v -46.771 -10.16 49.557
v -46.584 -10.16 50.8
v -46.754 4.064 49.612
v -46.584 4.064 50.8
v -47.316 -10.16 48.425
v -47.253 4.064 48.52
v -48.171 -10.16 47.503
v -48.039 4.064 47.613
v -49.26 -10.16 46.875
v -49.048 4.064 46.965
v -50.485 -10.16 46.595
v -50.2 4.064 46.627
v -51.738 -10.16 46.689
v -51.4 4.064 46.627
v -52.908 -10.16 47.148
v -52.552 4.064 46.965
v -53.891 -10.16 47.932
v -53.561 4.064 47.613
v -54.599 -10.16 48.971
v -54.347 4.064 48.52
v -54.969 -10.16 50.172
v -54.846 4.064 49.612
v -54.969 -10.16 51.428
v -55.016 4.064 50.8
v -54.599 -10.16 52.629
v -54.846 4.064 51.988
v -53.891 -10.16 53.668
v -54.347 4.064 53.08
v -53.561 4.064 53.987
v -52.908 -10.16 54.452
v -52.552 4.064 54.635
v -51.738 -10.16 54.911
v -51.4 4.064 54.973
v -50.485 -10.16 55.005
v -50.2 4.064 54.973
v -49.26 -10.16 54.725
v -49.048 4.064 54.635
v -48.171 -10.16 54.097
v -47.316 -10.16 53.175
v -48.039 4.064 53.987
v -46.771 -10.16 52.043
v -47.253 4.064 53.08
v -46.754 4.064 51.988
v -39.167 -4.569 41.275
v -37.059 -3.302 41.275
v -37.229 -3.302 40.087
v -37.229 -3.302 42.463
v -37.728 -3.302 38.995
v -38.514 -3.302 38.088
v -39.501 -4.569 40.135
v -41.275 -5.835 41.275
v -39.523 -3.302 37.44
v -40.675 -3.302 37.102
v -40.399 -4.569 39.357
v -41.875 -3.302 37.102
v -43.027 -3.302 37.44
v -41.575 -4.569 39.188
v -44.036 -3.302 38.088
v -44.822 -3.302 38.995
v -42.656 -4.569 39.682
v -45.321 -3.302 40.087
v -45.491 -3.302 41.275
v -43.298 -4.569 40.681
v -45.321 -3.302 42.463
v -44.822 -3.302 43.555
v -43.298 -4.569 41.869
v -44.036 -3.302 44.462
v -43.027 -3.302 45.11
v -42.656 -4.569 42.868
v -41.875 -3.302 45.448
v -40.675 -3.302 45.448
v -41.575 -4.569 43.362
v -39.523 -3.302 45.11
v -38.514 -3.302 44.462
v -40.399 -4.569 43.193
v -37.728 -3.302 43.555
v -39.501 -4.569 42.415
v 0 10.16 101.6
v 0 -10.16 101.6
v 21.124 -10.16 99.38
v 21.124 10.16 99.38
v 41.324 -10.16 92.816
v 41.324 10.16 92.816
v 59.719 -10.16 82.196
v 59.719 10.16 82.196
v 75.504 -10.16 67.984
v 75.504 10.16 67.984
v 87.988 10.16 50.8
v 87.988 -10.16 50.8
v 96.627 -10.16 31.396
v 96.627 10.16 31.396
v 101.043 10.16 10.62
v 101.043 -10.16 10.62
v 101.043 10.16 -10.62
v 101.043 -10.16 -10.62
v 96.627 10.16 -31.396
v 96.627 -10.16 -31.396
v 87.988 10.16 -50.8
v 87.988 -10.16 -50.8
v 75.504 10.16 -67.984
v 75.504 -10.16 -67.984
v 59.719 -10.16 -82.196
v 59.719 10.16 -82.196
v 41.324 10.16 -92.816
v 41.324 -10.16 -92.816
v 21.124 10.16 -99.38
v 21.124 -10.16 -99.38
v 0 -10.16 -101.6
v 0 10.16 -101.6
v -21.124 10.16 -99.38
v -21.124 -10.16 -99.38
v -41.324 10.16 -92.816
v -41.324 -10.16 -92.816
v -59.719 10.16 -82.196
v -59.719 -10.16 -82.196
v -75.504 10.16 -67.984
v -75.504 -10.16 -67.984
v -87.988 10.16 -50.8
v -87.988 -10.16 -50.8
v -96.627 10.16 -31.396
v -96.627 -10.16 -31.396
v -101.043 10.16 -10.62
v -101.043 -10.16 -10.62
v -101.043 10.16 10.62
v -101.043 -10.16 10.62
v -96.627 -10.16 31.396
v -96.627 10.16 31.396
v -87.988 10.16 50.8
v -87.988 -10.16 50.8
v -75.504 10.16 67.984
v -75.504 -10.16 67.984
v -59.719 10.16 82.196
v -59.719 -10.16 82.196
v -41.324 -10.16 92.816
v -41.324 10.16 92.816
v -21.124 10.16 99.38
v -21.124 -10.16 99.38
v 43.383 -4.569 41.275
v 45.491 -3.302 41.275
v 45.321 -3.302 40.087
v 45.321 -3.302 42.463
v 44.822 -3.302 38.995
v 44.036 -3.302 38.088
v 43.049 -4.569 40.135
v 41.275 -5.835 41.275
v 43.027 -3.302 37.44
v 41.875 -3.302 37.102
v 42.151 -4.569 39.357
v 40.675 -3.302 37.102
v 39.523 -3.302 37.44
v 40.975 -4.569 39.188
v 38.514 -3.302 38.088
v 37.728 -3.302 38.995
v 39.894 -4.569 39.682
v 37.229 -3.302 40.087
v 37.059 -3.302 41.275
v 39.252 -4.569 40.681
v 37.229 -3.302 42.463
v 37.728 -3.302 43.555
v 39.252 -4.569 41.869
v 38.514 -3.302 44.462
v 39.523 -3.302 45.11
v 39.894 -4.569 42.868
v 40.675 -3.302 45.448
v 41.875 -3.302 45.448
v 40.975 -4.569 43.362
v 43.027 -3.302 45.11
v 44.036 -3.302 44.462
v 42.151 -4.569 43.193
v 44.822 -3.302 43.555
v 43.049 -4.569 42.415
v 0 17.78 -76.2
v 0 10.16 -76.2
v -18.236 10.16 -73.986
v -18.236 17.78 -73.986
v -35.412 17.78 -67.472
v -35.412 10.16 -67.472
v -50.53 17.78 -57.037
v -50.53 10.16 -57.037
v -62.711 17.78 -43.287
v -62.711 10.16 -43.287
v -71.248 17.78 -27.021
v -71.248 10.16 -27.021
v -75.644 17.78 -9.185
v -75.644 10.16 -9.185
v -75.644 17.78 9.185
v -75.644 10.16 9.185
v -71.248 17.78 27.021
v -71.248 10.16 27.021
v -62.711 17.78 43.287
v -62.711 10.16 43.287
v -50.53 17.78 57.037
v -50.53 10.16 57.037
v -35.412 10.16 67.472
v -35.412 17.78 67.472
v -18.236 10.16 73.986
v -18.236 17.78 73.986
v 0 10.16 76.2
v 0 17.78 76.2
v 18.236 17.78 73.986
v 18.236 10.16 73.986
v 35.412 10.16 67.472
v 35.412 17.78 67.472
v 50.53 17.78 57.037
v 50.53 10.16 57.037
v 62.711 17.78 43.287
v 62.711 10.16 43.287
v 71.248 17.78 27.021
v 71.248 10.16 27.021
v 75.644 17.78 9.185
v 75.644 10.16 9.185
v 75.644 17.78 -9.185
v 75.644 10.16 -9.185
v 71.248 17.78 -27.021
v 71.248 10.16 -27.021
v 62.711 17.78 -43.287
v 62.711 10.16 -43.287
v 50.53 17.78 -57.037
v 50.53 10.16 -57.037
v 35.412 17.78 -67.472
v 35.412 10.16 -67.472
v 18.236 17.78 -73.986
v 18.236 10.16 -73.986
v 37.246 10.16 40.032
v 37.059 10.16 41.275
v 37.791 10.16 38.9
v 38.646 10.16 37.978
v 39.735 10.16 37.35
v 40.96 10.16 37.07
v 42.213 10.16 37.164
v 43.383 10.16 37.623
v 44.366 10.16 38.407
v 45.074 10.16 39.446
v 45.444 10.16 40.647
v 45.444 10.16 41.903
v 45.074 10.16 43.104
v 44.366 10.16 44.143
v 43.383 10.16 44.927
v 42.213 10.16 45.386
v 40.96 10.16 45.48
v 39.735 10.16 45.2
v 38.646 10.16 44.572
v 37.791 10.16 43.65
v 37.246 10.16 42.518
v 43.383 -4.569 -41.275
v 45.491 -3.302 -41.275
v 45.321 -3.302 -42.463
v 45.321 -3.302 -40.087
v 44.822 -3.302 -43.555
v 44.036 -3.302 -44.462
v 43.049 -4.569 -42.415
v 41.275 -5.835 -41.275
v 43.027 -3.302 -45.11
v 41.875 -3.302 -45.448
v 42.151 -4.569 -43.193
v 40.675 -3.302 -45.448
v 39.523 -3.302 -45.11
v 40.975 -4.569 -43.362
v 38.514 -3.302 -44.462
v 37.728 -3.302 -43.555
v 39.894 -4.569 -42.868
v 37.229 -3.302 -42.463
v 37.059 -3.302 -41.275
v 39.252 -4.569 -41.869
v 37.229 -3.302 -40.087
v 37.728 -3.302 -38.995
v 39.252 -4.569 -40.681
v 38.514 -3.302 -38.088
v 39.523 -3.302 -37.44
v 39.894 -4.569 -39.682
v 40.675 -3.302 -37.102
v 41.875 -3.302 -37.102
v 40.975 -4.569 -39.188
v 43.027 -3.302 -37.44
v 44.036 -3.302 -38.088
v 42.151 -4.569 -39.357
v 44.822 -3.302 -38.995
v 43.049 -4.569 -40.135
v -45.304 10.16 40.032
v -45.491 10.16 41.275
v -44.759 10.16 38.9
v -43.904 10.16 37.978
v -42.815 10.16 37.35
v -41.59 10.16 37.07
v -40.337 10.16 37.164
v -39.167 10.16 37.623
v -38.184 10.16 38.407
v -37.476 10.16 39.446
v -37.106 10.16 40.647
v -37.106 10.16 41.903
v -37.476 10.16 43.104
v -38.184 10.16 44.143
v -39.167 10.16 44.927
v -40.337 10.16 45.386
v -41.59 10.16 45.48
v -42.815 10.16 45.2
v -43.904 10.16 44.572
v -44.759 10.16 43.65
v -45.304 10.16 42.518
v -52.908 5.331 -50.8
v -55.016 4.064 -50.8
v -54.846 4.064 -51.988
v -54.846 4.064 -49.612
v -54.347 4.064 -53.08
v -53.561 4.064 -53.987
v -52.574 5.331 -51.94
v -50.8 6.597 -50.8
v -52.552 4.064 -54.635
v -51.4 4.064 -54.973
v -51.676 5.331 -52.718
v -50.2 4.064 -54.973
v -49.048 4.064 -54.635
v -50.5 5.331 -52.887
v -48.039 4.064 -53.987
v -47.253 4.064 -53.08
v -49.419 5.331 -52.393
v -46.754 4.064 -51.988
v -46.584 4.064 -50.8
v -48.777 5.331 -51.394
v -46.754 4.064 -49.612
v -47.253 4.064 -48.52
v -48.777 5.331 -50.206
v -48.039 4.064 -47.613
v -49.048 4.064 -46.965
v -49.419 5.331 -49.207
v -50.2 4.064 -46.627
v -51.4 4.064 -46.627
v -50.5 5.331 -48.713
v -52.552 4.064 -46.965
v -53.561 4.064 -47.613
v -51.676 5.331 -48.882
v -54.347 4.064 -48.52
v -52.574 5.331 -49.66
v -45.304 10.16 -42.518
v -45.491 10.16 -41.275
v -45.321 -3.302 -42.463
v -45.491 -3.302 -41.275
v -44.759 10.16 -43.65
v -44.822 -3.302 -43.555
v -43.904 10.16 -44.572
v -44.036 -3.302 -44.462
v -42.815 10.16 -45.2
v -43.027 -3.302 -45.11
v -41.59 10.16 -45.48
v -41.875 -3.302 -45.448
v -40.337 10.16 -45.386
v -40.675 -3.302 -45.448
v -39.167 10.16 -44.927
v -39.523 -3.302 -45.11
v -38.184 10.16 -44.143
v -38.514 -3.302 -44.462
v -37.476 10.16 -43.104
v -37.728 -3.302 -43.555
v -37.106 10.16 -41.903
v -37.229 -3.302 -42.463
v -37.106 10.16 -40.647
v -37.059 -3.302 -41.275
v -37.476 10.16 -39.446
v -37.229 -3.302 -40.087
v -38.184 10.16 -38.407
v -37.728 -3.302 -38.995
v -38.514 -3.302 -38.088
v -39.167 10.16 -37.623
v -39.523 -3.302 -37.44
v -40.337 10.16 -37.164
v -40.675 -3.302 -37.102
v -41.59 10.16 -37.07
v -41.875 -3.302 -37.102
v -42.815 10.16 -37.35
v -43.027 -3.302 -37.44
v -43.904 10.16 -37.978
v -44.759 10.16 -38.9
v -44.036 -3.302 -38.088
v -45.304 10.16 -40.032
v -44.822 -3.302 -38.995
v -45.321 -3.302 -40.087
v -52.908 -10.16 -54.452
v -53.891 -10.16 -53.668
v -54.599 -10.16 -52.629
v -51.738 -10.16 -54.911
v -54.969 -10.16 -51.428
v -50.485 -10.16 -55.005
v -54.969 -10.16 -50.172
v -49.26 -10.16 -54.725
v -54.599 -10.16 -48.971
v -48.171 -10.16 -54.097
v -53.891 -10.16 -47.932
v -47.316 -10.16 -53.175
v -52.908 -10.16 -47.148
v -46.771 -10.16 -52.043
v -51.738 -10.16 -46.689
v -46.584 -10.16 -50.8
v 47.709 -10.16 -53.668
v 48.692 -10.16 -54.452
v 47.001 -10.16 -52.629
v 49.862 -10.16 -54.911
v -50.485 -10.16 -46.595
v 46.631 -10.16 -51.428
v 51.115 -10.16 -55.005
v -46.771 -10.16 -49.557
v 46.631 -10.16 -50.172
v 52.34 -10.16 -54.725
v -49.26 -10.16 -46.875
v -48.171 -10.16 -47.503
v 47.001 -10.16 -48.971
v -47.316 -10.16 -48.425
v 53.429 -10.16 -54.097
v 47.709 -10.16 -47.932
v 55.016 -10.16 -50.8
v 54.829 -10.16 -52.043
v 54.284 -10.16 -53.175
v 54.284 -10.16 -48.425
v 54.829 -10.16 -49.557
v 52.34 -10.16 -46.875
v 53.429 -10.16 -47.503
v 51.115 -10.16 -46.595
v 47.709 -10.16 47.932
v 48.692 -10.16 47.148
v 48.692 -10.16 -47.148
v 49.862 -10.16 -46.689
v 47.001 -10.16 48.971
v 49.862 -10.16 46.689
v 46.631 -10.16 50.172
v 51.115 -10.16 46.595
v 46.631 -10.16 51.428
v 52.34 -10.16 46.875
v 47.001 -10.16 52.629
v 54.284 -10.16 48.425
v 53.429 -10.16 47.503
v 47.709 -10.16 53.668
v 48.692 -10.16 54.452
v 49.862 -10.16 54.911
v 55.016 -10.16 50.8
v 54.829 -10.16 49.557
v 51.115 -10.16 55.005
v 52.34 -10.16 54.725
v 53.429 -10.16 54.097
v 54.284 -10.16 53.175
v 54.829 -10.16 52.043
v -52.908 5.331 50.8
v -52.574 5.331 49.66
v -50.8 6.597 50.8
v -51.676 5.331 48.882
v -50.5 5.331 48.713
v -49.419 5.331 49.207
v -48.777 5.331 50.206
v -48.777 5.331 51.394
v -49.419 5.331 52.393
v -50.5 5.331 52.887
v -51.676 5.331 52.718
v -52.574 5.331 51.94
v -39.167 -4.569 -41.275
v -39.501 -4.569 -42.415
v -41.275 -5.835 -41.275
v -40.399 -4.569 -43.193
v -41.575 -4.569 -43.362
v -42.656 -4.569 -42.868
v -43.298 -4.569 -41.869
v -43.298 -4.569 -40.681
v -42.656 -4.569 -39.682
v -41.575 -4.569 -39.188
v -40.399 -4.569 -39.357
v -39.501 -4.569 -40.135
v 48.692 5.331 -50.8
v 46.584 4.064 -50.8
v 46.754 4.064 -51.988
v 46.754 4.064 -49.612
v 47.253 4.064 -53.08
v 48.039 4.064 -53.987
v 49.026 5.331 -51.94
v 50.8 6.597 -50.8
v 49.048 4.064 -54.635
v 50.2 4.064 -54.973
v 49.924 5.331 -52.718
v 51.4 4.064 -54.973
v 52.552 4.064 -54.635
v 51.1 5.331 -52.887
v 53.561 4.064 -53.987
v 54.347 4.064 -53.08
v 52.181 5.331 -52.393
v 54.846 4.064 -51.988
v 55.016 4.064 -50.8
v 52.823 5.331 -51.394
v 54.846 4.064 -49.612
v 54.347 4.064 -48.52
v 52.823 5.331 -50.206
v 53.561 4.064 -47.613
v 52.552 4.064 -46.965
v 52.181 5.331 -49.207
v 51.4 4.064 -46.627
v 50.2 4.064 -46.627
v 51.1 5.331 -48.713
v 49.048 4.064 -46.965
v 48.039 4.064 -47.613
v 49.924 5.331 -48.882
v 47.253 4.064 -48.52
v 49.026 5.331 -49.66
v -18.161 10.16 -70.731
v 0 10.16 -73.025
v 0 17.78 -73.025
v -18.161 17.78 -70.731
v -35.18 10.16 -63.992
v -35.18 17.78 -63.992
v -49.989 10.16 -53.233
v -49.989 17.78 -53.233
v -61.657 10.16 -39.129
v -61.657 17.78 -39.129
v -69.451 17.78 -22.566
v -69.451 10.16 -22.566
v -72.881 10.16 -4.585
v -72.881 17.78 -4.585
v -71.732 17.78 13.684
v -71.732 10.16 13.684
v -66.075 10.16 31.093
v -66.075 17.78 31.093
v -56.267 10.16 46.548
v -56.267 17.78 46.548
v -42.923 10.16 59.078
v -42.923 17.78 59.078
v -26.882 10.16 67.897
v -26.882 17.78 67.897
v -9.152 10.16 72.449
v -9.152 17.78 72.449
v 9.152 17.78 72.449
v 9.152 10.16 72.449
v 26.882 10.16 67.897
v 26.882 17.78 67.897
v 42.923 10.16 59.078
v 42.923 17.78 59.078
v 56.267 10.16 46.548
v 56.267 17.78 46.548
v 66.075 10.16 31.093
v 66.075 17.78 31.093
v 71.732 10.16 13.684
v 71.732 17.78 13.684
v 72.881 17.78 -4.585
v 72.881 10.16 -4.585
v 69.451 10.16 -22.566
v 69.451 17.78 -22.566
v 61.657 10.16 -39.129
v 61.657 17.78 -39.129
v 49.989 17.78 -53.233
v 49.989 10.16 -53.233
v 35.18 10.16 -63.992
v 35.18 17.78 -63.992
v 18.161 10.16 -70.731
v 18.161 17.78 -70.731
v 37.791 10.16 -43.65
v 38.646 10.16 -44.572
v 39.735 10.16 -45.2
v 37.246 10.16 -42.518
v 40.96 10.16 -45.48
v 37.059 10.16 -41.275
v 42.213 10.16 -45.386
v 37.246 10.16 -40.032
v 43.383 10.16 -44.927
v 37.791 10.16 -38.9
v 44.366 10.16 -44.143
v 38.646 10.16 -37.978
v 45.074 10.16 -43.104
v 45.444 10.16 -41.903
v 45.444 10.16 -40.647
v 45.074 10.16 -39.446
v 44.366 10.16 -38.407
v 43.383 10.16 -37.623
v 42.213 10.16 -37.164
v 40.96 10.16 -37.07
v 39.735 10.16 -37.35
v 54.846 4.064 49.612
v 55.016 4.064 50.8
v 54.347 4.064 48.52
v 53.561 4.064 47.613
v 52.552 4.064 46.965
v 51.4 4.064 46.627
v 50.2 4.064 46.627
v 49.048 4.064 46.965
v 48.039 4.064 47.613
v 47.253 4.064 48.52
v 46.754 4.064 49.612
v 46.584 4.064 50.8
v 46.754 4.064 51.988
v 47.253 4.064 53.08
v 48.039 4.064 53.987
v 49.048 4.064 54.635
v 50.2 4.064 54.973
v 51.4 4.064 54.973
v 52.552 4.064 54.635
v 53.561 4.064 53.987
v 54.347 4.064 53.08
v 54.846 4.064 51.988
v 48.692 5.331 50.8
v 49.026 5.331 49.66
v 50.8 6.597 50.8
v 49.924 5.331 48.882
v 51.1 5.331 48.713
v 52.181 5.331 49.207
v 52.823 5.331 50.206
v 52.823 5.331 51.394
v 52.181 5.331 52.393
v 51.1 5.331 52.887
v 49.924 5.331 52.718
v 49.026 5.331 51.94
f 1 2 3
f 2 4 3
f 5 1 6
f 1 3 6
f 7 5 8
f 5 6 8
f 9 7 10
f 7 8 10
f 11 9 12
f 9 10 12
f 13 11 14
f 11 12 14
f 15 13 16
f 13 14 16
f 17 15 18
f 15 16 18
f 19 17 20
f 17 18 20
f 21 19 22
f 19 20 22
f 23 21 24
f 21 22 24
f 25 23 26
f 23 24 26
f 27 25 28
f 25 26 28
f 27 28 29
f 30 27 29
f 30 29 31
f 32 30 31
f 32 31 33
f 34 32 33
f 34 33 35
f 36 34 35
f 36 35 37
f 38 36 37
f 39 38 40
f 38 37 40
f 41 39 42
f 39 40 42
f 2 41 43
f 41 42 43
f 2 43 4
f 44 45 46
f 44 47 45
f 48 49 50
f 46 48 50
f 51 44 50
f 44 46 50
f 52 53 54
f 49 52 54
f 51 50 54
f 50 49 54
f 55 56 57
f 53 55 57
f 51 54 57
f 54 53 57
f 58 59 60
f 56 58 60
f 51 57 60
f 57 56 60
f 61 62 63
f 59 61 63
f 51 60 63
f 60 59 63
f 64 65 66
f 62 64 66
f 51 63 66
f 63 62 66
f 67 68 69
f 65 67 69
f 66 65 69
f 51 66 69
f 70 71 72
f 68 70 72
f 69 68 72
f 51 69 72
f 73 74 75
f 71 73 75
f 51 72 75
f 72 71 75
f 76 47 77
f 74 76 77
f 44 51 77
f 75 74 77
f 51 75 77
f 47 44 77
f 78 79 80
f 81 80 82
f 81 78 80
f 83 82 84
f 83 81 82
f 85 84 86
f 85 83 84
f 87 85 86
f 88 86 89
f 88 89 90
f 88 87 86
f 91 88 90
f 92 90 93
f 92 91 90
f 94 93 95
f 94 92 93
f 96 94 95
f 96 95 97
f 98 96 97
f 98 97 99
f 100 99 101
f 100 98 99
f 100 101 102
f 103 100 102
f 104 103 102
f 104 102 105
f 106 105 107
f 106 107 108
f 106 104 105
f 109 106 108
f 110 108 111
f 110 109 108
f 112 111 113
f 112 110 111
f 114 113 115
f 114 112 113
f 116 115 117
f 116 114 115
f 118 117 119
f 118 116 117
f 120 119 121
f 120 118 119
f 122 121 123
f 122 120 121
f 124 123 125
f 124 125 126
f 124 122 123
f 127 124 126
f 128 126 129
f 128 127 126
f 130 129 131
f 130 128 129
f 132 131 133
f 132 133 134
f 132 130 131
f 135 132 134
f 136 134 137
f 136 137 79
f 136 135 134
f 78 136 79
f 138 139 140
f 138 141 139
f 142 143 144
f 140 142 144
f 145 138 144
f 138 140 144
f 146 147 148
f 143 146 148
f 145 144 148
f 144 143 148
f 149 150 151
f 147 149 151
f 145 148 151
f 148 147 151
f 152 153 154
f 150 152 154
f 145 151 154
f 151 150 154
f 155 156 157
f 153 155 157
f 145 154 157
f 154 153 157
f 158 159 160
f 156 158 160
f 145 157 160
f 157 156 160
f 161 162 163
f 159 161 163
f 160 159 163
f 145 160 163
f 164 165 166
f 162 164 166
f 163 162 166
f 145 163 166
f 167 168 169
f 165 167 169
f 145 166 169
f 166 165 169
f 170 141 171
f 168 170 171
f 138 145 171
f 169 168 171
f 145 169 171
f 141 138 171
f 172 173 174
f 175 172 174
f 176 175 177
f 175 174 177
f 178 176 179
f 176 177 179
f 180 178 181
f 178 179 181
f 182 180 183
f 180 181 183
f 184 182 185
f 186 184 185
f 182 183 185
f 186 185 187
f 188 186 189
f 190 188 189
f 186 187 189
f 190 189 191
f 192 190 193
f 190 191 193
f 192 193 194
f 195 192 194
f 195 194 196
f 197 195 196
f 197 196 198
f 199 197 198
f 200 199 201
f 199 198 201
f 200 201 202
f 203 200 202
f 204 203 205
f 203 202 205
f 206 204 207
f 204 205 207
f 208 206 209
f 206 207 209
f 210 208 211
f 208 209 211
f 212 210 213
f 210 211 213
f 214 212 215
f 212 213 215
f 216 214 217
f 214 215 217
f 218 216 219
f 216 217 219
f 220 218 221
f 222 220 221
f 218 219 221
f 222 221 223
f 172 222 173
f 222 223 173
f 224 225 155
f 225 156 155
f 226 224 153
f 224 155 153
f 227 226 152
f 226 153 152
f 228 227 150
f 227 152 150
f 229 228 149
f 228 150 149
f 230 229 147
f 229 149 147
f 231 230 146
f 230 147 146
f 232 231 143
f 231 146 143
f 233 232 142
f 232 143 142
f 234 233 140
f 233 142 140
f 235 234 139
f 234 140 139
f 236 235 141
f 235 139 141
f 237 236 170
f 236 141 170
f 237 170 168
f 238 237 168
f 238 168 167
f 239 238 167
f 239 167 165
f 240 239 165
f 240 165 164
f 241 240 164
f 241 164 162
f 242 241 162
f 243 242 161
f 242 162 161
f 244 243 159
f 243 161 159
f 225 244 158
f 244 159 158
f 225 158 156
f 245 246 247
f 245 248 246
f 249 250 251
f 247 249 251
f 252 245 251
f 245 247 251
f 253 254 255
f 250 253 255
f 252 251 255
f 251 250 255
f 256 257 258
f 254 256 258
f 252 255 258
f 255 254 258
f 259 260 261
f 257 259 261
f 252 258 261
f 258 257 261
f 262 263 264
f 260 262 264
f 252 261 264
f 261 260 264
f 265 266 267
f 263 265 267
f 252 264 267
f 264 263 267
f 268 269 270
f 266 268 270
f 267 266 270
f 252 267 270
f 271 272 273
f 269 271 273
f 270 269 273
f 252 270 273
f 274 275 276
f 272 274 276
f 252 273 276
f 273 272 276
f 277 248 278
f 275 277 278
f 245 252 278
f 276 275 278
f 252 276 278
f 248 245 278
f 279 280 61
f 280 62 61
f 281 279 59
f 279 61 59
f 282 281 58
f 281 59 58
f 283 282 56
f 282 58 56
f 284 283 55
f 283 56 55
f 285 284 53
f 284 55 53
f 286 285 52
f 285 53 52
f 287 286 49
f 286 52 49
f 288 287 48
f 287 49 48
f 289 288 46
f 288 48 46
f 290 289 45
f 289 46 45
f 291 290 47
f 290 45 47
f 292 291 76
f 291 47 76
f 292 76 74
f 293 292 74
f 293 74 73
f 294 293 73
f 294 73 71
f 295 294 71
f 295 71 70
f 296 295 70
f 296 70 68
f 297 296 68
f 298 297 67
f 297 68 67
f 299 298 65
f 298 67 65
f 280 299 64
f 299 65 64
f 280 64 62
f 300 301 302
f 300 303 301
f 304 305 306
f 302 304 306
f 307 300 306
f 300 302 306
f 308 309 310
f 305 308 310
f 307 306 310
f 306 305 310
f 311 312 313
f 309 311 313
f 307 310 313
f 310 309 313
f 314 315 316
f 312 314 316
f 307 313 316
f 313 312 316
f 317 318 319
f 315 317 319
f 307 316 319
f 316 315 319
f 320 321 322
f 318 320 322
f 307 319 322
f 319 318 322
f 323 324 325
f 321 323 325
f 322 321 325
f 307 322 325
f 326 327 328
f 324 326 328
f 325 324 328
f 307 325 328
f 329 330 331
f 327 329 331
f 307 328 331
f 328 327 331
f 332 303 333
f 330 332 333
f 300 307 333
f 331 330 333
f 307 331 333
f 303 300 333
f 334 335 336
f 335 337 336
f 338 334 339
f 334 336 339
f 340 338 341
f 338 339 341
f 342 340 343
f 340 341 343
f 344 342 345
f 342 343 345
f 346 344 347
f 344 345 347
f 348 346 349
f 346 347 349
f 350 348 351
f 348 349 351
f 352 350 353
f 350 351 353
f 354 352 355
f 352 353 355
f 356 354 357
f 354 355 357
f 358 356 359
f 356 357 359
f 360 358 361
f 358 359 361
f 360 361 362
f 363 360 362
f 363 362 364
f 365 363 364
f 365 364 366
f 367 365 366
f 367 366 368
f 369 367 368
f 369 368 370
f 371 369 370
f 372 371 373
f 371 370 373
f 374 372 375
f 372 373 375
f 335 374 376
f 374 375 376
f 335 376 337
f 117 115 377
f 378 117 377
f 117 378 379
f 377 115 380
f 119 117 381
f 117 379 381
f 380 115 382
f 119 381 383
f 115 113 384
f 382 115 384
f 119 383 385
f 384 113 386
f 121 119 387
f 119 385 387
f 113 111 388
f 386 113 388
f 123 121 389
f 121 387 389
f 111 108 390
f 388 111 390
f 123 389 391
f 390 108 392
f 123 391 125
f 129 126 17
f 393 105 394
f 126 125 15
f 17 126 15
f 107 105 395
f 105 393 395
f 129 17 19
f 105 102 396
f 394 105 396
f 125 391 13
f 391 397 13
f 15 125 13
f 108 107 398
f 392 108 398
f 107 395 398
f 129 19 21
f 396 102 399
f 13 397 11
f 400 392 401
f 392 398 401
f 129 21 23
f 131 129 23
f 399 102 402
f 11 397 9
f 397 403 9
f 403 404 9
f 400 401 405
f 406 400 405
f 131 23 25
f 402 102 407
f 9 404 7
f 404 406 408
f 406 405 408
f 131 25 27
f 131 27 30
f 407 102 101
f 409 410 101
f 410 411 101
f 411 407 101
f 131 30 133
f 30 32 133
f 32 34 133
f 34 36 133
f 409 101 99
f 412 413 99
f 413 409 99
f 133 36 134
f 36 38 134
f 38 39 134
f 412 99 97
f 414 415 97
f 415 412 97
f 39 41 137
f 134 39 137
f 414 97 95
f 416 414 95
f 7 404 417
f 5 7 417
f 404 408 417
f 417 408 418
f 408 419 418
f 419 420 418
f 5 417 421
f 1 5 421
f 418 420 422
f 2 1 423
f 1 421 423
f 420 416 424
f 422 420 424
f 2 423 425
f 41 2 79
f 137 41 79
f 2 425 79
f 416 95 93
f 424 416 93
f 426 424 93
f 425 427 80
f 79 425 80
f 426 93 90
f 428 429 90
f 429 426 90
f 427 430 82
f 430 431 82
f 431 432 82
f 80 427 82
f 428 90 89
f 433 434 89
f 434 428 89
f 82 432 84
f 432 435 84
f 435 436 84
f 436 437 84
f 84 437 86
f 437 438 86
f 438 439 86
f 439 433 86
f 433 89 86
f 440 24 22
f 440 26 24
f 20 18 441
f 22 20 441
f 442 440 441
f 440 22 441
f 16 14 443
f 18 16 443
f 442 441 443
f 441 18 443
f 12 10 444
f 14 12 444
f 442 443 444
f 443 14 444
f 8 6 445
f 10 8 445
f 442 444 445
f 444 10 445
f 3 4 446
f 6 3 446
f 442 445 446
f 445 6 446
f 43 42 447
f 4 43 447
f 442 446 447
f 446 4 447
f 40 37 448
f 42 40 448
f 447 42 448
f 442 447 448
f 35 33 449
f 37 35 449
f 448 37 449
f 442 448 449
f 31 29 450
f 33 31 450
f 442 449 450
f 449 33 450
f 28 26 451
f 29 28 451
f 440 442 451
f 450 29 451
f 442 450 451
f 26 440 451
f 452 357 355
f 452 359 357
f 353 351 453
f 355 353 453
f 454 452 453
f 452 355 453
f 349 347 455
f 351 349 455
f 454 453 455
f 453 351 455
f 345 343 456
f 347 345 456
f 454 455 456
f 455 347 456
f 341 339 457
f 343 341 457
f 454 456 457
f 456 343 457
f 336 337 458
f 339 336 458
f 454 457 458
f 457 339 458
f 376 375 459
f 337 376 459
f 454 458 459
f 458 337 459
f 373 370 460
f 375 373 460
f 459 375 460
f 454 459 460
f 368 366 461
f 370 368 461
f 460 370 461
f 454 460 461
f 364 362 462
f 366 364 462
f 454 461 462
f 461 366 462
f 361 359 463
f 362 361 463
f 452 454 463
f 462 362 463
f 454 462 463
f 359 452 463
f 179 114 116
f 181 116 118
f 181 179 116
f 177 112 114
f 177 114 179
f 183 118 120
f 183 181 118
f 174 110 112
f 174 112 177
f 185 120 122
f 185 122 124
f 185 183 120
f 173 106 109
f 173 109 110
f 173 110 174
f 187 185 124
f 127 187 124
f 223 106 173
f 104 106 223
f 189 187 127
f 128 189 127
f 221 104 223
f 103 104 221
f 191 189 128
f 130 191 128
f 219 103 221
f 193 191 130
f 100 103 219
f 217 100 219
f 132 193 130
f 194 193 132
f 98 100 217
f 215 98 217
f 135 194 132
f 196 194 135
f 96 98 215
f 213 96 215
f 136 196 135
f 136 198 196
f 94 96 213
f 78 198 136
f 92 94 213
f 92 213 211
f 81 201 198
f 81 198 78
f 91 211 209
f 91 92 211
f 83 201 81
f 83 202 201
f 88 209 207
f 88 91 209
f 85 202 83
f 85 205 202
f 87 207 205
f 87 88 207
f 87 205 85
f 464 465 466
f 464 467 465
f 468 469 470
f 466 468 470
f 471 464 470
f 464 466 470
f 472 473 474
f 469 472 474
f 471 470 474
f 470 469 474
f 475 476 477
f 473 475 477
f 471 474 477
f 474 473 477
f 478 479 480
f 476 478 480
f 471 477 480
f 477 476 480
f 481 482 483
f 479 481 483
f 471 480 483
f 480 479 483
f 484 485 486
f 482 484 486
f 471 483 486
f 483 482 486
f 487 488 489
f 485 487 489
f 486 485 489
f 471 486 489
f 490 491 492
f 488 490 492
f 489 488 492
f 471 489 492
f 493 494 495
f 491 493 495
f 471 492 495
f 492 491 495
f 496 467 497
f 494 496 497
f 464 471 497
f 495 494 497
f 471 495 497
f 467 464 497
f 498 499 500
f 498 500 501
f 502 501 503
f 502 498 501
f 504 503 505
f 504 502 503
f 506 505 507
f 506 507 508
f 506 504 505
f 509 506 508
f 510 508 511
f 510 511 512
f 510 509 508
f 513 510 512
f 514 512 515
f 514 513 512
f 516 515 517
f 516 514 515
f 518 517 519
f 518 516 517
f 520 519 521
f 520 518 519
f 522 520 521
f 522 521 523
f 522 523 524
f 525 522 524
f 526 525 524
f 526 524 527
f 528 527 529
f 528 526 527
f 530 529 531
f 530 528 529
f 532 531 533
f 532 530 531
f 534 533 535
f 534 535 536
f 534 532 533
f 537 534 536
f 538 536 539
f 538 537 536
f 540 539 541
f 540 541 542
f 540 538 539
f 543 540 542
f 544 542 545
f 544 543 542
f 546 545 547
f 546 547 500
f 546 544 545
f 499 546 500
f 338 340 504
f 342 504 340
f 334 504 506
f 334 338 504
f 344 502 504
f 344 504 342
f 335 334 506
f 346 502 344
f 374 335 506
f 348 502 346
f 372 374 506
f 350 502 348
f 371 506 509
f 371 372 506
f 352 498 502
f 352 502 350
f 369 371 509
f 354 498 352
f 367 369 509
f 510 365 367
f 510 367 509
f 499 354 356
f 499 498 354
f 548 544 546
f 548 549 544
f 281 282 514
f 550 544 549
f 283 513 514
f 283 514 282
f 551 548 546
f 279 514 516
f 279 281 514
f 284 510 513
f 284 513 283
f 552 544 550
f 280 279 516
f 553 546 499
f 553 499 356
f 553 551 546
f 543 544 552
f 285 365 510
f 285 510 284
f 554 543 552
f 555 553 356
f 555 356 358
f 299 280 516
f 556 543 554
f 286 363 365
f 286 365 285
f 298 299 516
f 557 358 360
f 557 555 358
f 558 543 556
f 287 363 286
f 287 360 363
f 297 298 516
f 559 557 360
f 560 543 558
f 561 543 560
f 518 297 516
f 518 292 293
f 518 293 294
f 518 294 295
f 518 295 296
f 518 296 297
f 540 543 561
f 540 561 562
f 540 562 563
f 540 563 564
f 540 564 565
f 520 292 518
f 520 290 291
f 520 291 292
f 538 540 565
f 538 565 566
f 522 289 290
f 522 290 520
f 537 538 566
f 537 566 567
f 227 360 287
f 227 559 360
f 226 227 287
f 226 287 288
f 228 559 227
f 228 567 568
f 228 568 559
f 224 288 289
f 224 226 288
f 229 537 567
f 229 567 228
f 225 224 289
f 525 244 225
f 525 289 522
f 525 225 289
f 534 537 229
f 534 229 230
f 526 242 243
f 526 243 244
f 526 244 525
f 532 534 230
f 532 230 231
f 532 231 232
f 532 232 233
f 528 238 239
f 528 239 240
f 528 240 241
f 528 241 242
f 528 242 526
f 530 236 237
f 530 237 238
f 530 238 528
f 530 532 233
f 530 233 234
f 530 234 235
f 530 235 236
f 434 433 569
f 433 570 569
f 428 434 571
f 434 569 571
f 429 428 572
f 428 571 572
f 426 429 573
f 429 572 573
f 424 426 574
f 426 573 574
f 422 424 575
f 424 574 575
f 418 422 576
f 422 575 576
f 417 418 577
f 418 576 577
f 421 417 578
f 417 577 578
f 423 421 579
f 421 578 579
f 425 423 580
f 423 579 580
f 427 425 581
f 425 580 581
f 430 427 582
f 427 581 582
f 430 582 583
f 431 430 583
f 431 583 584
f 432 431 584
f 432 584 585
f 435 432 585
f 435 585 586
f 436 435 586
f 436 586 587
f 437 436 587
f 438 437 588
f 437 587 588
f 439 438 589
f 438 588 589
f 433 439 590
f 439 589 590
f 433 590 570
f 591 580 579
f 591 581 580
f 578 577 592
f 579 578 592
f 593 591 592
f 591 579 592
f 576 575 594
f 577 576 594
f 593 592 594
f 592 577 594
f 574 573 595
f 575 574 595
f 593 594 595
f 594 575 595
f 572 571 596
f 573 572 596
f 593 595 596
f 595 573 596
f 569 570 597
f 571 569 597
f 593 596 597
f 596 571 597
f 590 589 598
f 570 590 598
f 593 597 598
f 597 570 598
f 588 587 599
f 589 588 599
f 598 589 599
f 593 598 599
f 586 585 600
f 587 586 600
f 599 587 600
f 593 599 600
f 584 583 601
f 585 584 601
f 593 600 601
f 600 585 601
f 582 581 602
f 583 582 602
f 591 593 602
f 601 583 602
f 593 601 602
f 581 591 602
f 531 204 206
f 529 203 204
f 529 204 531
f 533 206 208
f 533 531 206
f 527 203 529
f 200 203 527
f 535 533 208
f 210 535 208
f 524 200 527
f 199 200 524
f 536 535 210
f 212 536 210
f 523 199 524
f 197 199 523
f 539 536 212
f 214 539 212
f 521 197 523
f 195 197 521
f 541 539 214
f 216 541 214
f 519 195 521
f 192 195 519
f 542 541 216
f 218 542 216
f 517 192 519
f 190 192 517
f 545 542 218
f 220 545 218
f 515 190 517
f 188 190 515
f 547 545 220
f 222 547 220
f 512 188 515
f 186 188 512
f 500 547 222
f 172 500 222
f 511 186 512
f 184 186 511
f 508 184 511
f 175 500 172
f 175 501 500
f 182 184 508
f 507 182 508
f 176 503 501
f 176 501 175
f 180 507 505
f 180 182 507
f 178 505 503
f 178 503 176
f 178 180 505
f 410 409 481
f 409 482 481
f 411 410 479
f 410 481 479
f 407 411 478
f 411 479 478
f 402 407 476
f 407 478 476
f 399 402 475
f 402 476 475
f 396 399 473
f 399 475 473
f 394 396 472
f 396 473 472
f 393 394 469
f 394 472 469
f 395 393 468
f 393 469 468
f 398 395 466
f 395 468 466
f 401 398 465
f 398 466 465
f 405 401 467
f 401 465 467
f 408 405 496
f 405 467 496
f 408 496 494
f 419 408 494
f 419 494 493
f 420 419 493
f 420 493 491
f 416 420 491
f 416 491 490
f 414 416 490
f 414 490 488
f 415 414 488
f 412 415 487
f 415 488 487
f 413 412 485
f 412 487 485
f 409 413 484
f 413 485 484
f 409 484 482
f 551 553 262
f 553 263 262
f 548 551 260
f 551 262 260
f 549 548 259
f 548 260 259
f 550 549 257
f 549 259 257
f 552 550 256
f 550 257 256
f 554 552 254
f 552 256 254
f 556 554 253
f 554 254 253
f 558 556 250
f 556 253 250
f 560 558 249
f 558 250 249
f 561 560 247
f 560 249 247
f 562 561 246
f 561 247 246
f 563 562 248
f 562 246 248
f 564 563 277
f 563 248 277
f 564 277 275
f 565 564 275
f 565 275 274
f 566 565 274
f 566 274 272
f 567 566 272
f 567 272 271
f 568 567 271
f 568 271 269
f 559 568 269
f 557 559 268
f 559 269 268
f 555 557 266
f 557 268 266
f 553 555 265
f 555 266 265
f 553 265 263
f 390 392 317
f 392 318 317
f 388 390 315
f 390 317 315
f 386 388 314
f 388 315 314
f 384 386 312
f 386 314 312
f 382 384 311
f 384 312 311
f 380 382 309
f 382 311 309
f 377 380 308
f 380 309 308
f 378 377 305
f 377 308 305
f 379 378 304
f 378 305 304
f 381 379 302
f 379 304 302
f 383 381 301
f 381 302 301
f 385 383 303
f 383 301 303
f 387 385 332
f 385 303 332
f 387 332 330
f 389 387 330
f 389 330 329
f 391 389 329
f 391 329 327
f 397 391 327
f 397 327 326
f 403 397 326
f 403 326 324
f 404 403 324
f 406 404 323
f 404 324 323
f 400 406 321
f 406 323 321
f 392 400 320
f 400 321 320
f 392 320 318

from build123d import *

# Parameters (mm, degrees)
SKETCH1_R                   = 101.6
BOSS_EXTRUDE1_DEPTH         = 10.16
F_3_8_24_TAPPED_HOLE2_D     = 8.4328
F_3_8_24_TAPPED_HOLE2_DEPTH = 13.462
F_3_8_24_TAPPED_HOLE2_TIP   = 2.533468714
F_3_8_24_TAPPED_HOLE1_D     = 8.4328
F_3_8_24_TAPPED_HOLE1_DEPTH = 14.224
F_3_8_24_TAPPED_HOLE1_TIP   = 2.533468714
SKETCH2_R                   = 76.2
SKETCH2_R_2                 = 73.025
BOSS_EXTRUDE2_DEPTH         = 7.62


with BuildPart() as part:
    # Sketch1 → Boss-Extrude1 (new, symmetric)
    with BuildSketch(Plane(origin=(0, 0, 0), x_dir=(1, 0, 0), z_dir=(0, 1, 0))):
        with Locations(Location((0, 0, 0), (0, 0, 270))):
            Circle(SKETCH1_R)
    extrude(amount=BOSS_EXTRUDE1_DEPTH, both=True)

    # 3/8-24 Tapped Hole2
    with Locations(Plane(origin=(0, 10.16, 0), x_dir=(1, 0, 0), z_dir=(0, 1, 0))):
        with Locations((-41.275, 41.275), (41.275, 41.275), (41.275, -41.275), (-41.275, -41.275)):
            Hole(F_3_8_24_TAPPED_HOLE2_D / 2, depth=F_3_8_24_TAPPED_HOLE2_DEPTH)
            with Locations((0, 0, -(F_3_8_24_TAPPED_HOLE2_DEPTH + F_3_8_24_TAPPED_HOLE2_TIP / 2))):  # 118° drill point
                Cone(0, F_3_8_24_TAPPED_HOLE2_D / 2, F_3_8_24_TAPPED_HOLE2_TIP, mode=Mode.SUBTRACT)

    # 3/8-24 Tapped Hole1
    with Locations(Plane(origin=(0, -10.16, 0), x_dir=(-1, 0, 0), z_dir=(0, -1, 0))):
        with Locations((50.8, -50.8), (-50.8, -50.8), (-50.8, 50.8), (50.8, 50.8)):
            Hole(F_3_8_24_TAPPED_HOLE1_D / 2, depth=F_3_8_24_TAPPED_HOLE1_DEPTH)
            with Locations((0, 0, -(F_3_8_24_TAPPED_HOLE1_DEPTH + F_3_8_24_TAPPED_HOLE1_TIP / 2))):  # 118° drill point
                Cone(0, F_3_8_24_TAPPED_HOLE1_D / 2, F_3_8_24_TAPPED_HOLE1_TIP, mode=Mode.SUBTRACT)

    # Sketch2 → Boss-Extrude2 (add)
    with BuildSketch(Plane(origin=(0, 10.16, 0), x_dir=(1, 0, 0), z_dir=(0, 1, 0))):
        with Locations(Location((0, 0, 0), (0, 0, 90))):
            Circle(SKETCH2_R)
        with Locations(Location((0, 0, 0), (0, 0, 90))):
            Circle(SKETCH2_R_2, mode=Mode.SUBTRACT)
    extrude(amount=BOSS_EXTRUDE2_DEPTH)


solid = part.part
